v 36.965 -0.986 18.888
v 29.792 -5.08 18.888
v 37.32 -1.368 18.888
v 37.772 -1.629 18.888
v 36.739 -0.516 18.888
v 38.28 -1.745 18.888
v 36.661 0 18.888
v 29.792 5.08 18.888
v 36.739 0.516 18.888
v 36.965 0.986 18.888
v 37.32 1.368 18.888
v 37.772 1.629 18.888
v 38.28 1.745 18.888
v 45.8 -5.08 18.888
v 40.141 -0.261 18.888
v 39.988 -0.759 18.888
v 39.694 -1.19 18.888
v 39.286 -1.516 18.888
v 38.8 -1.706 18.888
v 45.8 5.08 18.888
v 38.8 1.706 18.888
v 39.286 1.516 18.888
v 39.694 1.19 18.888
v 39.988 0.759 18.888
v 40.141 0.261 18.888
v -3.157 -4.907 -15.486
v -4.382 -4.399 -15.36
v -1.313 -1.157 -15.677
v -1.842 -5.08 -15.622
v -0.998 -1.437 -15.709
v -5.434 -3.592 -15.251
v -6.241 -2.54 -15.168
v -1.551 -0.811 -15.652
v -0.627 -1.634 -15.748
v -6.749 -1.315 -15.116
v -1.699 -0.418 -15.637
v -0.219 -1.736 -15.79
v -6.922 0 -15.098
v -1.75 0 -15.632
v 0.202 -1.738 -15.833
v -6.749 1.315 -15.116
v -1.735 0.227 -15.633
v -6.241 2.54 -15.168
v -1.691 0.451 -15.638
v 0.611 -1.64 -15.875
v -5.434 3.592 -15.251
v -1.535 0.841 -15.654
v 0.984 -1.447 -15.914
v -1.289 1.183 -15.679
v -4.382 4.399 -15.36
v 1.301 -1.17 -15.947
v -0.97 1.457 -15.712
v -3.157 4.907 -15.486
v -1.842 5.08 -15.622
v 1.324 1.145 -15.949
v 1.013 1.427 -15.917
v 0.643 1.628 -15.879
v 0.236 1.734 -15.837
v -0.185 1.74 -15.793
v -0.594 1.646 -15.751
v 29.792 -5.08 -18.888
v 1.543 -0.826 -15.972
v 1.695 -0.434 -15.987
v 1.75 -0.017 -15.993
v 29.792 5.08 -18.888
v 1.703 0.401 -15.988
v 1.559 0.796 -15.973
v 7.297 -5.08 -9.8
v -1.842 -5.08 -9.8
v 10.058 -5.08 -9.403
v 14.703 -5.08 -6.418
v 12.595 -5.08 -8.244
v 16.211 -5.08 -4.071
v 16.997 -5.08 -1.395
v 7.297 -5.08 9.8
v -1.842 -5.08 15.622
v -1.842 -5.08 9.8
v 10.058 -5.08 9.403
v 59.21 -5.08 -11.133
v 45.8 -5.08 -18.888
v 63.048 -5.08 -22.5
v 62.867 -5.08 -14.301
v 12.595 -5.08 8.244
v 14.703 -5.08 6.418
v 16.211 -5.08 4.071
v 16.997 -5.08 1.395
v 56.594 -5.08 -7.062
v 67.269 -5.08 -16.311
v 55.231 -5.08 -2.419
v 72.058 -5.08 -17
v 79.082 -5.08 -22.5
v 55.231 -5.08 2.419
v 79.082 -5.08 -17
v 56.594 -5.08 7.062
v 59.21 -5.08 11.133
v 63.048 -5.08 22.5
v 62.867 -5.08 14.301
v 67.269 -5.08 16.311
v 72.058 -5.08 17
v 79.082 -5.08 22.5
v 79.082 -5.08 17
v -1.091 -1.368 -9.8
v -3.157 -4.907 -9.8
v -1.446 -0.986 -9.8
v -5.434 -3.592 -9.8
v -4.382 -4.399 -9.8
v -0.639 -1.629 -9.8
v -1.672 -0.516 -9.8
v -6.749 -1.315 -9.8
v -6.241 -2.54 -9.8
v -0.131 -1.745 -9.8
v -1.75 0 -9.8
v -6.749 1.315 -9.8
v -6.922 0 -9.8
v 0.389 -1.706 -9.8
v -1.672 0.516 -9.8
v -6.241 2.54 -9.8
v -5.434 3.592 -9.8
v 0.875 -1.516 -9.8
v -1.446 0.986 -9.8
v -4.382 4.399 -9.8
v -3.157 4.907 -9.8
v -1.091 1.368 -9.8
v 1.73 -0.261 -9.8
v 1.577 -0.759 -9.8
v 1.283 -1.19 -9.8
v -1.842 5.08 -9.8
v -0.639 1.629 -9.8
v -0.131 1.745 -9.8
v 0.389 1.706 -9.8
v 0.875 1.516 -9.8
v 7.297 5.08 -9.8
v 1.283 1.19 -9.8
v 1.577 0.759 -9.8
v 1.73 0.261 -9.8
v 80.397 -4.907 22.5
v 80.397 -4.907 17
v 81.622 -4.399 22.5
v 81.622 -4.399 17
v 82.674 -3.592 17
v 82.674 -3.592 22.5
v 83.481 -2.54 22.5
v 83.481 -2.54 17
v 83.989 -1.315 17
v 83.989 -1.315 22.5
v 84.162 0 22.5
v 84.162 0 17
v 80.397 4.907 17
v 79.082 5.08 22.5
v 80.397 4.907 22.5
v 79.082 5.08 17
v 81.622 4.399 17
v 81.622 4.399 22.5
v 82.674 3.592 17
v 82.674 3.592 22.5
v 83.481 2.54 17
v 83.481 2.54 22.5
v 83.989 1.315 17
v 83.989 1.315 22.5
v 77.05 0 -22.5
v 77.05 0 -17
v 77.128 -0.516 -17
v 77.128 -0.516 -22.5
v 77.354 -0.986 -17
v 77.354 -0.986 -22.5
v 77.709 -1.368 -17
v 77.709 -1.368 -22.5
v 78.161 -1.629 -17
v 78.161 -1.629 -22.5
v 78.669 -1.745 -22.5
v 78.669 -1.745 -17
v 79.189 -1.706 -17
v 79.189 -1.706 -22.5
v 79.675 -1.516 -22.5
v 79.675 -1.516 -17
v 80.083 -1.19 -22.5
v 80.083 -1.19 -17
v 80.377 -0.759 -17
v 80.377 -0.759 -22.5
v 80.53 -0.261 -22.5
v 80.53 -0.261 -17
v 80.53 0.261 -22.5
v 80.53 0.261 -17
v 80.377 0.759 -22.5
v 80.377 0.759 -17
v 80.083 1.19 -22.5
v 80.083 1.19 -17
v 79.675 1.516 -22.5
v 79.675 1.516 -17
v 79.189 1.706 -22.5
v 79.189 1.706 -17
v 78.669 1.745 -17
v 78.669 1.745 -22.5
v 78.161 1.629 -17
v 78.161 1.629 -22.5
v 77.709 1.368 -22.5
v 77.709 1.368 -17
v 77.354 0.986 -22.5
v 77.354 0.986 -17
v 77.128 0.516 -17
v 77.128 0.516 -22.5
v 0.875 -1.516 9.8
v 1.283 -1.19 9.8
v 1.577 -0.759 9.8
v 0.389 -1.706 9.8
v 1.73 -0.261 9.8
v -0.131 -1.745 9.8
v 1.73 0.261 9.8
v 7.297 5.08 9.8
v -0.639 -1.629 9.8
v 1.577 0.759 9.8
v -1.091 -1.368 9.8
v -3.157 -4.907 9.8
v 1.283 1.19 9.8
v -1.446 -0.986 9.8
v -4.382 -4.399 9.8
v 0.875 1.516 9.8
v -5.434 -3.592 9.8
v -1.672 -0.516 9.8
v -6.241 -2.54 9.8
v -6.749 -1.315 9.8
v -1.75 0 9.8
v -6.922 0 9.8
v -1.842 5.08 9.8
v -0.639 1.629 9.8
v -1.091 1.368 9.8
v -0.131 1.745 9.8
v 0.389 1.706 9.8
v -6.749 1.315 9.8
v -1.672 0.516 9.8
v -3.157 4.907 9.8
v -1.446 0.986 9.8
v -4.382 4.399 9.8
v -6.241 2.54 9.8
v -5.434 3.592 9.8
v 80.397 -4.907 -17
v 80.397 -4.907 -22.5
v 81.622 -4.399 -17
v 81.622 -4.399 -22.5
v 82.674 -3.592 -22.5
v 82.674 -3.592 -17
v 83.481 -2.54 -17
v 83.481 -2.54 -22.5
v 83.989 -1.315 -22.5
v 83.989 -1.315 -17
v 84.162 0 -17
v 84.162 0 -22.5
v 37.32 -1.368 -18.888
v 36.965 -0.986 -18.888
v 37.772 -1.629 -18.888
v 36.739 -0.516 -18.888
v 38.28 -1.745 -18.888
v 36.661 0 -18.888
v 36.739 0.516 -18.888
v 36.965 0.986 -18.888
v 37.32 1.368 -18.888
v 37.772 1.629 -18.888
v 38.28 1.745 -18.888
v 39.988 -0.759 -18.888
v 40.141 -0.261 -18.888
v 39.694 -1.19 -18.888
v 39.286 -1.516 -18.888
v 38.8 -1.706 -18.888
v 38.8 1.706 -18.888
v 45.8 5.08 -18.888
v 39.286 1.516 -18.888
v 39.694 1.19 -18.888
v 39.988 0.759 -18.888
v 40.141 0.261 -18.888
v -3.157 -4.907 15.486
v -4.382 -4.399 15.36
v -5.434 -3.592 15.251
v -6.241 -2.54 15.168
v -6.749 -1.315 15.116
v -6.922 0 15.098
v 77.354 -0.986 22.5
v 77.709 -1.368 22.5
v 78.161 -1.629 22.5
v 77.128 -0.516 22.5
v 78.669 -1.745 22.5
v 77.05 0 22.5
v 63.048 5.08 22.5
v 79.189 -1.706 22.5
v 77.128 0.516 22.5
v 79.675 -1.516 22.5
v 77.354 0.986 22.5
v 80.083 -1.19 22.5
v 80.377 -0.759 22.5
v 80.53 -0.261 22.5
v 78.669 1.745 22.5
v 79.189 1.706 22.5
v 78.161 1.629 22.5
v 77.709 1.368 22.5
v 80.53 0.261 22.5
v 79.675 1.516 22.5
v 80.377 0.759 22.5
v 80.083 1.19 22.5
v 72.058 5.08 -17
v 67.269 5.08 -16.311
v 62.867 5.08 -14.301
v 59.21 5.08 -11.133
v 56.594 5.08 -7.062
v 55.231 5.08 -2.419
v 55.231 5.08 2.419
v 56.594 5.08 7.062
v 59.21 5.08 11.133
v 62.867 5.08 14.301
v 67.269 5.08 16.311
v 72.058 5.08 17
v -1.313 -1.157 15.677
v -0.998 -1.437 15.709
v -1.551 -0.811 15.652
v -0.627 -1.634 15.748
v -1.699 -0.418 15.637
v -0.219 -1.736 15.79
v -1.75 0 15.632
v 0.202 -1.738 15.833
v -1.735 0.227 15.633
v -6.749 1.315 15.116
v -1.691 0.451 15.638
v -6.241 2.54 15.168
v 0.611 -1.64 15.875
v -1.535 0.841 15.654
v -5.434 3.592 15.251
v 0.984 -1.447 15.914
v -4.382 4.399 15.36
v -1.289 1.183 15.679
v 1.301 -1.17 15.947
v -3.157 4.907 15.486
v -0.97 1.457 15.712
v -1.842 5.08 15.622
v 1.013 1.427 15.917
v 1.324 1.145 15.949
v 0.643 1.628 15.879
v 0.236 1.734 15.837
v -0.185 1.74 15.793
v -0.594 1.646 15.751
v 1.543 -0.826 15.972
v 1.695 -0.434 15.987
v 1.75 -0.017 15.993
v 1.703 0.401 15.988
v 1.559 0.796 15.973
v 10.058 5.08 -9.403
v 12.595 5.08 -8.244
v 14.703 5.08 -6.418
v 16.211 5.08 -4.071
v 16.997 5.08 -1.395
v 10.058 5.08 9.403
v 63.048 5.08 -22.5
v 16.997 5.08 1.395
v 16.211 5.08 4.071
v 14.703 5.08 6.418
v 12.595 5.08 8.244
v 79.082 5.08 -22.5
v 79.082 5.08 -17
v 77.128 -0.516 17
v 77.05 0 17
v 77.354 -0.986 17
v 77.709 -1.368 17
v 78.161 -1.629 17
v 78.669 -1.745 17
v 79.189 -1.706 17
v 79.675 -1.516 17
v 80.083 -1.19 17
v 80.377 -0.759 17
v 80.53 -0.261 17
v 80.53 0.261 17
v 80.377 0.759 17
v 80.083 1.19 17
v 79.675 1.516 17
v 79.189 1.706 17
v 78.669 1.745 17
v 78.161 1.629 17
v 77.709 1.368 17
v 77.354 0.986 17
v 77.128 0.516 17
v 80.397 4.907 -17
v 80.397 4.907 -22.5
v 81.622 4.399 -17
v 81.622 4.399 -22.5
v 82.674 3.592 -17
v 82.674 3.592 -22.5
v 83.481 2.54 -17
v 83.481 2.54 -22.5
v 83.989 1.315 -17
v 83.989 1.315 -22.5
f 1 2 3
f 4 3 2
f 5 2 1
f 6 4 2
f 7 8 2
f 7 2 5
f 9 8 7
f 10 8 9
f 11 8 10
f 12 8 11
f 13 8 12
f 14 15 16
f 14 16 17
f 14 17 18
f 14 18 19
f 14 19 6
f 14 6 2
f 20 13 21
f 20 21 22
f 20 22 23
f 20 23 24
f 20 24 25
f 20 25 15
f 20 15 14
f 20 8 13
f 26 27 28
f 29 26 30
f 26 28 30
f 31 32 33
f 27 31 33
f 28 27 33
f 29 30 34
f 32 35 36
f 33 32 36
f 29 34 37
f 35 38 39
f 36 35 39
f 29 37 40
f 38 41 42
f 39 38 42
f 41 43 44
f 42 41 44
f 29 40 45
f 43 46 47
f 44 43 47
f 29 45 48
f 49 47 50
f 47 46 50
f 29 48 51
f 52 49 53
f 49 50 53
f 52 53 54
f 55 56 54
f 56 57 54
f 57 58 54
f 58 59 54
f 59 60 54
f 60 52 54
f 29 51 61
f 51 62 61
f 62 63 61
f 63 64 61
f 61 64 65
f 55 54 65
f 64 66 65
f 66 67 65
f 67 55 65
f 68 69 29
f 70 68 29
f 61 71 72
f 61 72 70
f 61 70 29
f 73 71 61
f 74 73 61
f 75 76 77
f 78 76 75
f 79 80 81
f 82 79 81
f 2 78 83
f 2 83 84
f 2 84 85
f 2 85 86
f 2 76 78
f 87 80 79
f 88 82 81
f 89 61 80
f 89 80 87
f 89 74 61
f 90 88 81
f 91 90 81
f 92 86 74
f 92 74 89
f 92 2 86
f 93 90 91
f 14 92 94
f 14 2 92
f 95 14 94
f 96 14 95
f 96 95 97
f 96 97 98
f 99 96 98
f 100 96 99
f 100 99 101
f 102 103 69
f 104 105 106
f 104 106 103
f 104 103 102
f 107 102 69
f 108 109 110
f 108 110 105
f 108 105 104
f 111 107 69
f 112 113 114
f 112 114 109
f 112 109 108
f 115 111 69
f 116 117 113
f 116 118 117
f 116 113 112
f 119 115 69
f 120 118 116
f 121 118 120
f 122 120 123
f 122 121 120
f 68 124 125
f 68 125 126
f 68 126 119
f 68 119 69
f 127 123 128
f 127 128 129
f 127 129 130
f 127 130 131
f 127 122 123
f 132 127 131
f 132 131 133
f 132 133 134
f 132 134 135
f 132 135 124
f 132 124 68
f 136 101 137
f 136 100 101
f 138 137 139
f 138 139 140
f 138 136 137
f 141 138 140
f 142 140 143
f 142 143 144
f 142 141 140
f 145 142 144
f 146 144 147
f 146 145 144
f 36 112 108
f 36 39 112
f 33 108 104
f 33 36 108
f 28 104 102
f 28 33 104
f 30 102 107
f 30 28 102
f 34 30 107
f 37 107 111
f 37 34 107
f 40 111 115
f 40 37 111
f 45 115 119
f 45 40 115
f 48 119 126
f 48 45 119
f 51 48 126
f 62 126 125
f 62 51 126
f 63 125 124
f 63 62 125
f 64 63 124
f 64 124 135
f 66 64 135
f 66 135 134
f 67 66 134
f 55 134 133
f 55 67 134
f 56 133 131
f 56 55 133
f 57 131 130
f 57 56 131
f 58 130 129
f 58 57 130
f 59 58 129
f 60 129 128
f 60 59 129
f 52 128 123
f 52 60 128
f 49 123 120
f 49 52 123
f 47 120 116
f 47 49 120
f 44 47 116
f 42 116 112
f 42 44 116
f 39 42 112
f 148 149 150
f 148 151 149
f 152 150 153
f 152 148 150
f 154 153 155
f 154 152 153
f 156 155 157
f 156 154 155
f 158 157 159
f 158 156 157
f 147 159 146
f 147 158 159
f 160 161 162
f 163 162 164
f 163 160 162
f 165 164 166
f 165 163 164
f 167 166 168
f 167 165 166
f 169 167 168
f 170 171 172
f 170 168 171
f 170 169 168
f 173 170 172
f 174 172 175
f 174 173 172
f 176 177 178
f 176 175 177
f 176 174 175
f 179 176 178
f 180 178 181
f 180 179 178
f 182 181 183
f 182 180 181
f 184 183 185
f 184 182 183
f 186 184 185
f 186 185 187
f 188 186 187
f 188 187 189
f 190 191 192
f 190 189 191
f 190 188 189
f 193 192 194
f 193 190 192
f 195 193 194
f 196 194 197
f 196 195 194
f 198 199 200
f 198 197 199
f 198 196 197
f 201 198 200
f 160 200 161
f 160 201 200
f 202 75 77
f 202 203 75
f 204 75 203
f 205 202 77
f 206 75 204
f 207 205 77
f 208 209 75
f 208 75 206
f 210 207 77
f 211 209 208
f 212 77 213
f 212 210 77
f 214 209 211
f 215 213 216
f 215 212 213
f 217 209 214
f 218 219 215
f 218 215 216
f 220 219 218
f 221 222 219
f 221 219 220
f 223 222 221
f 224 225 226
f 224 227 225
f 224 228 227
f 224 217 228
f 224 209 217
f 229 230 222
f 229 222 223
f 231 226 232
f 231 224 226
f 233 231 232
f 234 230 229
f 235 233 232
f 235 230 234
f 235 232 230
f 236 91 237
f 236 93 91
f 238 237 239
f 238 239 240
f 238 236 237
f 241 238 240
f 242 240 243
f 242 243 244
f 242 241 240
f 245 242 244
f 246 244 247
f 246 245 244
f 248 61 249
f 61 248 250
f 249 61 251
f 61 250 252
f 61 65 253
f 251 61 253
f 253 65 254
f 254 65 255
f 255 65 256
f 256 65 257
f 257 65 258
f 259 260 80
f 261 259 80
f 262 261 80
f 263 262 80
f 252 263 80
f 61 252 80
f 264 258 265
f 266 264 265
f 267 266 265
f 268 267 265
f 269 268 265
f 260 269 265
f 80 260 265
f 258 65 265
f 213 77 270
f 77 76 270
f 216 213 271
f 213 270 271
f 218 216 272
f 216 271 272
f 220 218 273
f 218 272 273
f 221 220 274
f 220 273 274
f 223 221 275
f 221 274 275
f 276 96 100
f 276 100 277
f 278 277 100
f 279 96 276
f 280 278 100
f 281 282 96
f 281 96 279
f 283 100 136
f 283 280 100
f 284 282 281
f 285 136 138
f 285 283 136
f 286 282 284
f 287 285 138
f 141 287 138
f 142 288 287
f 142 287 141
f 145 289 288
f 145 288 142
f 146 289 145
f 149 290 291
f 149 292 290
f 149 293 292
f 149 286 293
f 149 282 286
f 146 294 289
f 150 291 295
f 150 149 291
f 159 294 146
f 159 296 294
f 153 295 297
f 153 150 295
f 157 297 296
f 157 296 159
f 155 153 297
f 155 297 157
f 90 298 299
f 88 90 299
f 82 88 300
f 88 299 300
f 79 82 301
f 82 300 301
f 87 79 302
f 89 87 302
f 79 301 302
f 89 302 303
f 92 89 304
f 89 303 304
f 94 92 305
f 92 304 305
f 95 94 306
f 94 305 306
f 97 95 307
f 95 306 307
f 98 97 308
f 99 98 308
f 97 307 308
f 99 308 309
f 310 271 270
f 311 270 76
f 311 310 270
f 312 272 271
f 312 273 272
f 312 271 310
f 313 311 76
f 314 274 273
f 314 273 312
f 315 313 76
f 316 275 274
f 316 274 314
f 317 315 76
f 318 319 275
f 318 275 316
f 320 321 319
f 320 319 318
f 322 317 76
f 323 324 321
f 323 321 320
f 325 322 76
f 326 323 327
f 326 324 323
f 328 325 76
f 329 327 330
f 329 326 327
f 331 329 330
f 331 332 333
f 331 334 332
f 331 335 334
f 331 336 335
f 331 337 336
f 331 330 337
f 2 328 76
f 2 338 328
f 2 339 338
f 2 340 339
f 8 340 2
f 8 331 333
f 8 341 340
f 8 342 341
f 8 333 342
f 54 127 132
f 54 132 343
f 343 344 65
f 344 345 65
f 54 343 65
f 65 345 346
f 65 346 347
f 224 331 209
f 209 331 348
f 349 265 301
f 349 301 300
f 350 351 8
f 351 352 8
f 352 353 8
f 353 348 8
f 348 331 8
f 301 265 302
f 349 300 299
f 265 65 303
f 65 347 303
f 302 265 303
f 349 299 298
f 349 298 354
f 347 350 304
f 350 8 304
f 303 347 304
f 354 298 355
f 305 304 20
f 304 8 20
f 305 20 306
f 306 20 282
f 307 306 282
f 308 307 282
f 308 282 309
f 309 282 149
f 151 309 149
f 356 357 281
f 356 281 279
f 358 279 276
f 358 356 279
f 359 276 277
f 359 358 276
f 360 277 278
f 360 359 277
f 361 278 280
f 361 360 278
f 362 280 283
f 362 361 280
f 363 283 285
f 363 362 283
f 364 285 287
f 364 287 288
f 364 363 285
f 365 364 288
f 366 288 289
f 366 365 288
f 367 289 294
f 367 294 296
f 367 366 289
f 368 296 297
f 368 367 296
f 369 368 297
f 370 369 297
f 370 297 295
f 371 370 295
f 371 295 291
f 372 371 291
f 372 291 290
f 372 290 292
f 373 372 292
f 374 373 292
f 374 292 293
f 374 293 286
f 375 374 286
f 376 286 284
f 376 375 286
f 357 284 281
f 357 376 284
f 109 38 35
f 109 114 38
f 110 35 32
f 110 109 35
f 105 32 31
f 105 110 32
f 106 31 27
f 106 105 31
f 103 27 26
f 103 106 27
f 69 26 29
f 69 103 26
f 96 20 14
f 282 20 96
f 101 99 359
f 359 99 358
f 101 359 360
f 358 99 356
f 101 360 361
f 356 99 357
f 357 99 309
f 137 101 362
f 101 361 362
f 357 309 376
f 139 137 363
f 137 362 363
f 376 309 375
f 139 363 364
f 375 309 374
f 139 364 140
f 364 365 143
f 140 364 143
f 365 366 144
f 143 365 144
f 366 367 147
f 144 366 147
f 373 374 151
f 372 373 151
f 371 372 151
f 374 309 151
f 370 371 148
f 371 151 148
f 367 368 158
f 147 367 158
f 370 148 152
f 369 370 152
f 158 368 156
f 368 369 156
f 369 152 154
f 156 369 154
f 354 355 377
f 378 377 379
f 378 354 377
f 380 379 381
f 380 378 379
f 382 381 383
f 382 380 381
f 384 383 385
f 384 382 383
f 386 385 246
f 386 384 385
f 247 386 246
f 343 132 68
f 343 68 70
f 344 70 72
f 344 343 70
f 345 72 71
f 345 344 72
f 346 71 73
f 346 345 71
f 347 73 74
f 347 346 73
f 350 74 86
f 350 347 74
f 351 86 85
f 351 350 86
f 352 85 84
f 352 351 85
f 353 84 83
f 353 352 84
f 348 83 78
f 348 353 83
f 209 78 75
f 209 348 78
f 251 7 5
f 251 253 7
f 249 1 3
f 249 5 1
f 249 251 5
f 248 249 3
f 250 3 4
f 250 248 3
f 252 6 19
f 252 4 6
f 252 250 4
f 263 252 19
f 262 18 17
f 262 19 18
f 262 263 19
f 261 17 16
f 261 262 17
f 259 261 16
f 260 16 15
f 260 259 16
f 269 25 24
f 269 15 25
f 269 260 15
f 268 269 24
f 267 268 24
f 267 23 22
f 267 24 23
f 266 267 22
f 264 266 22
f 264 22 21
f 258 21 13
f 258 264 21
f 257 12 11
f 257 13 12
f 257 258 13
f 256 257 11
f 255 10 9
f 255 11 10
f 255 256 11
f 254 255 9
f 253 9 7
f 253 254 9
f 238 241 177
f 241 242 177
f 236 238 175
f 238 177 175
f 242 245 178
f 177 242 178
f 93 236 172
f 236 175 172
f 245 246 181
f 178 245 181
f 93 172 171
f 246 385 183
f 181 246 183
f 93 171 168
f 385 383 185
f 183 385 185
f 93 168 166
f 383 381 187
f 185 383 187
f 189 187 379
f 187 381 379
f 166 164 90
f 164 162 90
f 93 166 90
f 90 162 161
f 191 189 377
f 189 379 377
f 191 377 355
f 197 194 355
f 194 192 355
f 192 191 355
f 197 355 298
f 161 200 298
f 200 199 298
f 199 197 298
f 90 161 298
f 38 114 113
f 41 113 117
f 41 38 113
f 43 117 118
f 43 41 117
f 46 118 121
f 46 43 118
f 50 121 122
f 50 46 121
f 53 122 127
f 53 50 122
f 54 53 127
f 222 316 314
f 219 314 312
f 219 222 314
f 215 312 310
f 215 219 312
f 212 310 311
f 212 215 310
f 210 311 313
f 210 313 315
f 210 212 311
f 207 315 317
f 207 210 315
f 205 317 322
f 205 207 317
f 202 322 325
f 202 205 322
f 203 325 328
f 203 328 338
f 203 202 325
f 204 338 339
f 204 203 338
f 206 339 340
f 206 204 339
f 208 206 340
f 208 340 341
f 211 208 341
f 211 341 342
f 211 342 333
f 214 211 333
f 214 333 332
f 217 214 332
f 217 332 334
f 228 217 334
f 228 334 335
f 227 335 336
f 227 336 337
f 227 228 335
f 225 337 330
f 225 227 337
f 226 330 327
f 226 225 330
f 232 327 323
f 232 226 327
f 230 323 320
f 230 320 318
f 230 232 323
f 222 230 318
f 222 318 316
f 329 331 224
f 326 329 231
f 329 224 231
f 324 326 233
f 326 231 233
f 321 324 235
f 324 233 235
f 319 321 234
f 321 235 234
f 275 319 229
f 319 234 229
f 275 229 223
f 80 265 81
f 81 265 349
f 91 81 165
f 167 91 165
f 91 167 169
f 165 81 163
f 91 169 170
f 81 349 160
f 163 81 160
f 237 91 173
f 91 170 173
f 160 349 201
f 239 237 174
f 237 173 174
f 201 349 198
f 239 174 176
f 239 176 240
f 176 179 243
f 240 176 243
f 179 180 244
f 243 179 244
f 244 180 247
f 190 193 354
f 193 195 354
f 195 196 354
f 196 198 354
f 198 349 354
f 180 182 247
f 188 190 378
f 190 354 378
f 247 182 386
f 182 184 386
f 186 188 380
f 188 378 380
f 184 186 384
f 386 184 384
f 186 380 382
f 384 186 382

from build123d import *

# Parameters (mm, degrees)
SKETCH2_W           = 91.08348254
SKETCH2_H           = 10.16
SKETCH2_R           = 1.75
BOSS_EXTRUDE1_DEPTH = 22.5
CUT_EXTRUDE1_DEPTH  = 88.707853004
FILLET1_R           = 5.08


with BuildPart() as part:
    # Sketch2 → Boss-Extrude1 (new, symmetric)
    with BuildSketch(Plane.XY):
        with Locations((38.619959512, 0)):
            Rectangle(SKETCH2_W, SKETCH2_H)
        with Locations(Location((38.410945338, 0, 0), (0, 0, 180))):
            Circle(SKETCH2_R, mode=Mode.SUBTRACT)
        with Locations(Location((0, 0, 0), (0, 0, 180))):
            Circle(SKETCH2_R, mode=Mode.SUBTRACT)
        with Locations(Location((78.79999988, 0, 0), (0, 0, 180))):
            Circle(SKETCH2_R, mode=Mode.SUBTRACT)
    extrude(amount=BOSS_EXTRUDE1_DEPTH, both=True)

    # Sketch3 → Cut-Extrude1 (cut, through all)
    with BuildSketch(Plane(origin=(0, 5.08, 0), x_dir=(1, 0, 0), z_dir=(0, 1, 0))):
        with BuildLine():
            Line((91.724321271, 17), (72.05824076, 17))
            ThreePointArc((72.05824076, 17), (55.05824076, 0), (72.05824076, -17))
            Line((72.05824076, -17), (91.724321271, -17))
            Line((91.724321271, -17), (91.724321271, 17))
        make_face()
        Polygon((-6.921781758, 15.097756516), (29.791957943, 18.888274186), (45.800007469, 18.888274186), (63.048045595, 22.5), (63.048045595, 41.563803389), (-6.921781758, 41.563803389), align=None)
        with BuildLine():
            Line((-35.26716372, 9.799999958), (7.296822355, 9.799999958))
            ThreePointArc((7.296822355, 9.799999958), (17.096822313, 0), (7.296822355, -9.799999958))
            Line((7.296822355, -9.799999958), (-35.26716372, -9.799999958))
            Line((-35.26716372, -9.799999958), (-35.26716372, 9.799999958))
        make_face()
        Polygon((63.048045595, -22.5), (63.048045595, -41.563803389), (-6.921781758, -41.563803389), (-6.921781758, -15.097756516), (29.791957943, -18.888274186), (45.800007469, -18.888274186), align=None)
    extrude(amount=-CUT_EXTRUDE1_DEPTH, mode=Mode.SUBTRACT)

    # Fillet1
    fillet1_edges = [part.edges().sort_by_distance(p)[0] for p in [
        (-6.921781758, 5.08, -12.448878237),
        (-6.921781758, -5.08, -12.448878237),
        (-6.921781758, -5.08, 12.448878237),
        (-6.921781758, 5.08, 12.448878237),
        (84.161700782, -5.08, -19.75),
        (84.161700782, -5.08, 19.75),
        (84.161700782, 5.08, 19.75),
        (84.161700782, 5.08, -19.75),
    ]]
    fillet(fillet1_edges, radius=FILLET1_R - 0.0001)  # a hair under: the kernel refuses the full size


solid = part.part
